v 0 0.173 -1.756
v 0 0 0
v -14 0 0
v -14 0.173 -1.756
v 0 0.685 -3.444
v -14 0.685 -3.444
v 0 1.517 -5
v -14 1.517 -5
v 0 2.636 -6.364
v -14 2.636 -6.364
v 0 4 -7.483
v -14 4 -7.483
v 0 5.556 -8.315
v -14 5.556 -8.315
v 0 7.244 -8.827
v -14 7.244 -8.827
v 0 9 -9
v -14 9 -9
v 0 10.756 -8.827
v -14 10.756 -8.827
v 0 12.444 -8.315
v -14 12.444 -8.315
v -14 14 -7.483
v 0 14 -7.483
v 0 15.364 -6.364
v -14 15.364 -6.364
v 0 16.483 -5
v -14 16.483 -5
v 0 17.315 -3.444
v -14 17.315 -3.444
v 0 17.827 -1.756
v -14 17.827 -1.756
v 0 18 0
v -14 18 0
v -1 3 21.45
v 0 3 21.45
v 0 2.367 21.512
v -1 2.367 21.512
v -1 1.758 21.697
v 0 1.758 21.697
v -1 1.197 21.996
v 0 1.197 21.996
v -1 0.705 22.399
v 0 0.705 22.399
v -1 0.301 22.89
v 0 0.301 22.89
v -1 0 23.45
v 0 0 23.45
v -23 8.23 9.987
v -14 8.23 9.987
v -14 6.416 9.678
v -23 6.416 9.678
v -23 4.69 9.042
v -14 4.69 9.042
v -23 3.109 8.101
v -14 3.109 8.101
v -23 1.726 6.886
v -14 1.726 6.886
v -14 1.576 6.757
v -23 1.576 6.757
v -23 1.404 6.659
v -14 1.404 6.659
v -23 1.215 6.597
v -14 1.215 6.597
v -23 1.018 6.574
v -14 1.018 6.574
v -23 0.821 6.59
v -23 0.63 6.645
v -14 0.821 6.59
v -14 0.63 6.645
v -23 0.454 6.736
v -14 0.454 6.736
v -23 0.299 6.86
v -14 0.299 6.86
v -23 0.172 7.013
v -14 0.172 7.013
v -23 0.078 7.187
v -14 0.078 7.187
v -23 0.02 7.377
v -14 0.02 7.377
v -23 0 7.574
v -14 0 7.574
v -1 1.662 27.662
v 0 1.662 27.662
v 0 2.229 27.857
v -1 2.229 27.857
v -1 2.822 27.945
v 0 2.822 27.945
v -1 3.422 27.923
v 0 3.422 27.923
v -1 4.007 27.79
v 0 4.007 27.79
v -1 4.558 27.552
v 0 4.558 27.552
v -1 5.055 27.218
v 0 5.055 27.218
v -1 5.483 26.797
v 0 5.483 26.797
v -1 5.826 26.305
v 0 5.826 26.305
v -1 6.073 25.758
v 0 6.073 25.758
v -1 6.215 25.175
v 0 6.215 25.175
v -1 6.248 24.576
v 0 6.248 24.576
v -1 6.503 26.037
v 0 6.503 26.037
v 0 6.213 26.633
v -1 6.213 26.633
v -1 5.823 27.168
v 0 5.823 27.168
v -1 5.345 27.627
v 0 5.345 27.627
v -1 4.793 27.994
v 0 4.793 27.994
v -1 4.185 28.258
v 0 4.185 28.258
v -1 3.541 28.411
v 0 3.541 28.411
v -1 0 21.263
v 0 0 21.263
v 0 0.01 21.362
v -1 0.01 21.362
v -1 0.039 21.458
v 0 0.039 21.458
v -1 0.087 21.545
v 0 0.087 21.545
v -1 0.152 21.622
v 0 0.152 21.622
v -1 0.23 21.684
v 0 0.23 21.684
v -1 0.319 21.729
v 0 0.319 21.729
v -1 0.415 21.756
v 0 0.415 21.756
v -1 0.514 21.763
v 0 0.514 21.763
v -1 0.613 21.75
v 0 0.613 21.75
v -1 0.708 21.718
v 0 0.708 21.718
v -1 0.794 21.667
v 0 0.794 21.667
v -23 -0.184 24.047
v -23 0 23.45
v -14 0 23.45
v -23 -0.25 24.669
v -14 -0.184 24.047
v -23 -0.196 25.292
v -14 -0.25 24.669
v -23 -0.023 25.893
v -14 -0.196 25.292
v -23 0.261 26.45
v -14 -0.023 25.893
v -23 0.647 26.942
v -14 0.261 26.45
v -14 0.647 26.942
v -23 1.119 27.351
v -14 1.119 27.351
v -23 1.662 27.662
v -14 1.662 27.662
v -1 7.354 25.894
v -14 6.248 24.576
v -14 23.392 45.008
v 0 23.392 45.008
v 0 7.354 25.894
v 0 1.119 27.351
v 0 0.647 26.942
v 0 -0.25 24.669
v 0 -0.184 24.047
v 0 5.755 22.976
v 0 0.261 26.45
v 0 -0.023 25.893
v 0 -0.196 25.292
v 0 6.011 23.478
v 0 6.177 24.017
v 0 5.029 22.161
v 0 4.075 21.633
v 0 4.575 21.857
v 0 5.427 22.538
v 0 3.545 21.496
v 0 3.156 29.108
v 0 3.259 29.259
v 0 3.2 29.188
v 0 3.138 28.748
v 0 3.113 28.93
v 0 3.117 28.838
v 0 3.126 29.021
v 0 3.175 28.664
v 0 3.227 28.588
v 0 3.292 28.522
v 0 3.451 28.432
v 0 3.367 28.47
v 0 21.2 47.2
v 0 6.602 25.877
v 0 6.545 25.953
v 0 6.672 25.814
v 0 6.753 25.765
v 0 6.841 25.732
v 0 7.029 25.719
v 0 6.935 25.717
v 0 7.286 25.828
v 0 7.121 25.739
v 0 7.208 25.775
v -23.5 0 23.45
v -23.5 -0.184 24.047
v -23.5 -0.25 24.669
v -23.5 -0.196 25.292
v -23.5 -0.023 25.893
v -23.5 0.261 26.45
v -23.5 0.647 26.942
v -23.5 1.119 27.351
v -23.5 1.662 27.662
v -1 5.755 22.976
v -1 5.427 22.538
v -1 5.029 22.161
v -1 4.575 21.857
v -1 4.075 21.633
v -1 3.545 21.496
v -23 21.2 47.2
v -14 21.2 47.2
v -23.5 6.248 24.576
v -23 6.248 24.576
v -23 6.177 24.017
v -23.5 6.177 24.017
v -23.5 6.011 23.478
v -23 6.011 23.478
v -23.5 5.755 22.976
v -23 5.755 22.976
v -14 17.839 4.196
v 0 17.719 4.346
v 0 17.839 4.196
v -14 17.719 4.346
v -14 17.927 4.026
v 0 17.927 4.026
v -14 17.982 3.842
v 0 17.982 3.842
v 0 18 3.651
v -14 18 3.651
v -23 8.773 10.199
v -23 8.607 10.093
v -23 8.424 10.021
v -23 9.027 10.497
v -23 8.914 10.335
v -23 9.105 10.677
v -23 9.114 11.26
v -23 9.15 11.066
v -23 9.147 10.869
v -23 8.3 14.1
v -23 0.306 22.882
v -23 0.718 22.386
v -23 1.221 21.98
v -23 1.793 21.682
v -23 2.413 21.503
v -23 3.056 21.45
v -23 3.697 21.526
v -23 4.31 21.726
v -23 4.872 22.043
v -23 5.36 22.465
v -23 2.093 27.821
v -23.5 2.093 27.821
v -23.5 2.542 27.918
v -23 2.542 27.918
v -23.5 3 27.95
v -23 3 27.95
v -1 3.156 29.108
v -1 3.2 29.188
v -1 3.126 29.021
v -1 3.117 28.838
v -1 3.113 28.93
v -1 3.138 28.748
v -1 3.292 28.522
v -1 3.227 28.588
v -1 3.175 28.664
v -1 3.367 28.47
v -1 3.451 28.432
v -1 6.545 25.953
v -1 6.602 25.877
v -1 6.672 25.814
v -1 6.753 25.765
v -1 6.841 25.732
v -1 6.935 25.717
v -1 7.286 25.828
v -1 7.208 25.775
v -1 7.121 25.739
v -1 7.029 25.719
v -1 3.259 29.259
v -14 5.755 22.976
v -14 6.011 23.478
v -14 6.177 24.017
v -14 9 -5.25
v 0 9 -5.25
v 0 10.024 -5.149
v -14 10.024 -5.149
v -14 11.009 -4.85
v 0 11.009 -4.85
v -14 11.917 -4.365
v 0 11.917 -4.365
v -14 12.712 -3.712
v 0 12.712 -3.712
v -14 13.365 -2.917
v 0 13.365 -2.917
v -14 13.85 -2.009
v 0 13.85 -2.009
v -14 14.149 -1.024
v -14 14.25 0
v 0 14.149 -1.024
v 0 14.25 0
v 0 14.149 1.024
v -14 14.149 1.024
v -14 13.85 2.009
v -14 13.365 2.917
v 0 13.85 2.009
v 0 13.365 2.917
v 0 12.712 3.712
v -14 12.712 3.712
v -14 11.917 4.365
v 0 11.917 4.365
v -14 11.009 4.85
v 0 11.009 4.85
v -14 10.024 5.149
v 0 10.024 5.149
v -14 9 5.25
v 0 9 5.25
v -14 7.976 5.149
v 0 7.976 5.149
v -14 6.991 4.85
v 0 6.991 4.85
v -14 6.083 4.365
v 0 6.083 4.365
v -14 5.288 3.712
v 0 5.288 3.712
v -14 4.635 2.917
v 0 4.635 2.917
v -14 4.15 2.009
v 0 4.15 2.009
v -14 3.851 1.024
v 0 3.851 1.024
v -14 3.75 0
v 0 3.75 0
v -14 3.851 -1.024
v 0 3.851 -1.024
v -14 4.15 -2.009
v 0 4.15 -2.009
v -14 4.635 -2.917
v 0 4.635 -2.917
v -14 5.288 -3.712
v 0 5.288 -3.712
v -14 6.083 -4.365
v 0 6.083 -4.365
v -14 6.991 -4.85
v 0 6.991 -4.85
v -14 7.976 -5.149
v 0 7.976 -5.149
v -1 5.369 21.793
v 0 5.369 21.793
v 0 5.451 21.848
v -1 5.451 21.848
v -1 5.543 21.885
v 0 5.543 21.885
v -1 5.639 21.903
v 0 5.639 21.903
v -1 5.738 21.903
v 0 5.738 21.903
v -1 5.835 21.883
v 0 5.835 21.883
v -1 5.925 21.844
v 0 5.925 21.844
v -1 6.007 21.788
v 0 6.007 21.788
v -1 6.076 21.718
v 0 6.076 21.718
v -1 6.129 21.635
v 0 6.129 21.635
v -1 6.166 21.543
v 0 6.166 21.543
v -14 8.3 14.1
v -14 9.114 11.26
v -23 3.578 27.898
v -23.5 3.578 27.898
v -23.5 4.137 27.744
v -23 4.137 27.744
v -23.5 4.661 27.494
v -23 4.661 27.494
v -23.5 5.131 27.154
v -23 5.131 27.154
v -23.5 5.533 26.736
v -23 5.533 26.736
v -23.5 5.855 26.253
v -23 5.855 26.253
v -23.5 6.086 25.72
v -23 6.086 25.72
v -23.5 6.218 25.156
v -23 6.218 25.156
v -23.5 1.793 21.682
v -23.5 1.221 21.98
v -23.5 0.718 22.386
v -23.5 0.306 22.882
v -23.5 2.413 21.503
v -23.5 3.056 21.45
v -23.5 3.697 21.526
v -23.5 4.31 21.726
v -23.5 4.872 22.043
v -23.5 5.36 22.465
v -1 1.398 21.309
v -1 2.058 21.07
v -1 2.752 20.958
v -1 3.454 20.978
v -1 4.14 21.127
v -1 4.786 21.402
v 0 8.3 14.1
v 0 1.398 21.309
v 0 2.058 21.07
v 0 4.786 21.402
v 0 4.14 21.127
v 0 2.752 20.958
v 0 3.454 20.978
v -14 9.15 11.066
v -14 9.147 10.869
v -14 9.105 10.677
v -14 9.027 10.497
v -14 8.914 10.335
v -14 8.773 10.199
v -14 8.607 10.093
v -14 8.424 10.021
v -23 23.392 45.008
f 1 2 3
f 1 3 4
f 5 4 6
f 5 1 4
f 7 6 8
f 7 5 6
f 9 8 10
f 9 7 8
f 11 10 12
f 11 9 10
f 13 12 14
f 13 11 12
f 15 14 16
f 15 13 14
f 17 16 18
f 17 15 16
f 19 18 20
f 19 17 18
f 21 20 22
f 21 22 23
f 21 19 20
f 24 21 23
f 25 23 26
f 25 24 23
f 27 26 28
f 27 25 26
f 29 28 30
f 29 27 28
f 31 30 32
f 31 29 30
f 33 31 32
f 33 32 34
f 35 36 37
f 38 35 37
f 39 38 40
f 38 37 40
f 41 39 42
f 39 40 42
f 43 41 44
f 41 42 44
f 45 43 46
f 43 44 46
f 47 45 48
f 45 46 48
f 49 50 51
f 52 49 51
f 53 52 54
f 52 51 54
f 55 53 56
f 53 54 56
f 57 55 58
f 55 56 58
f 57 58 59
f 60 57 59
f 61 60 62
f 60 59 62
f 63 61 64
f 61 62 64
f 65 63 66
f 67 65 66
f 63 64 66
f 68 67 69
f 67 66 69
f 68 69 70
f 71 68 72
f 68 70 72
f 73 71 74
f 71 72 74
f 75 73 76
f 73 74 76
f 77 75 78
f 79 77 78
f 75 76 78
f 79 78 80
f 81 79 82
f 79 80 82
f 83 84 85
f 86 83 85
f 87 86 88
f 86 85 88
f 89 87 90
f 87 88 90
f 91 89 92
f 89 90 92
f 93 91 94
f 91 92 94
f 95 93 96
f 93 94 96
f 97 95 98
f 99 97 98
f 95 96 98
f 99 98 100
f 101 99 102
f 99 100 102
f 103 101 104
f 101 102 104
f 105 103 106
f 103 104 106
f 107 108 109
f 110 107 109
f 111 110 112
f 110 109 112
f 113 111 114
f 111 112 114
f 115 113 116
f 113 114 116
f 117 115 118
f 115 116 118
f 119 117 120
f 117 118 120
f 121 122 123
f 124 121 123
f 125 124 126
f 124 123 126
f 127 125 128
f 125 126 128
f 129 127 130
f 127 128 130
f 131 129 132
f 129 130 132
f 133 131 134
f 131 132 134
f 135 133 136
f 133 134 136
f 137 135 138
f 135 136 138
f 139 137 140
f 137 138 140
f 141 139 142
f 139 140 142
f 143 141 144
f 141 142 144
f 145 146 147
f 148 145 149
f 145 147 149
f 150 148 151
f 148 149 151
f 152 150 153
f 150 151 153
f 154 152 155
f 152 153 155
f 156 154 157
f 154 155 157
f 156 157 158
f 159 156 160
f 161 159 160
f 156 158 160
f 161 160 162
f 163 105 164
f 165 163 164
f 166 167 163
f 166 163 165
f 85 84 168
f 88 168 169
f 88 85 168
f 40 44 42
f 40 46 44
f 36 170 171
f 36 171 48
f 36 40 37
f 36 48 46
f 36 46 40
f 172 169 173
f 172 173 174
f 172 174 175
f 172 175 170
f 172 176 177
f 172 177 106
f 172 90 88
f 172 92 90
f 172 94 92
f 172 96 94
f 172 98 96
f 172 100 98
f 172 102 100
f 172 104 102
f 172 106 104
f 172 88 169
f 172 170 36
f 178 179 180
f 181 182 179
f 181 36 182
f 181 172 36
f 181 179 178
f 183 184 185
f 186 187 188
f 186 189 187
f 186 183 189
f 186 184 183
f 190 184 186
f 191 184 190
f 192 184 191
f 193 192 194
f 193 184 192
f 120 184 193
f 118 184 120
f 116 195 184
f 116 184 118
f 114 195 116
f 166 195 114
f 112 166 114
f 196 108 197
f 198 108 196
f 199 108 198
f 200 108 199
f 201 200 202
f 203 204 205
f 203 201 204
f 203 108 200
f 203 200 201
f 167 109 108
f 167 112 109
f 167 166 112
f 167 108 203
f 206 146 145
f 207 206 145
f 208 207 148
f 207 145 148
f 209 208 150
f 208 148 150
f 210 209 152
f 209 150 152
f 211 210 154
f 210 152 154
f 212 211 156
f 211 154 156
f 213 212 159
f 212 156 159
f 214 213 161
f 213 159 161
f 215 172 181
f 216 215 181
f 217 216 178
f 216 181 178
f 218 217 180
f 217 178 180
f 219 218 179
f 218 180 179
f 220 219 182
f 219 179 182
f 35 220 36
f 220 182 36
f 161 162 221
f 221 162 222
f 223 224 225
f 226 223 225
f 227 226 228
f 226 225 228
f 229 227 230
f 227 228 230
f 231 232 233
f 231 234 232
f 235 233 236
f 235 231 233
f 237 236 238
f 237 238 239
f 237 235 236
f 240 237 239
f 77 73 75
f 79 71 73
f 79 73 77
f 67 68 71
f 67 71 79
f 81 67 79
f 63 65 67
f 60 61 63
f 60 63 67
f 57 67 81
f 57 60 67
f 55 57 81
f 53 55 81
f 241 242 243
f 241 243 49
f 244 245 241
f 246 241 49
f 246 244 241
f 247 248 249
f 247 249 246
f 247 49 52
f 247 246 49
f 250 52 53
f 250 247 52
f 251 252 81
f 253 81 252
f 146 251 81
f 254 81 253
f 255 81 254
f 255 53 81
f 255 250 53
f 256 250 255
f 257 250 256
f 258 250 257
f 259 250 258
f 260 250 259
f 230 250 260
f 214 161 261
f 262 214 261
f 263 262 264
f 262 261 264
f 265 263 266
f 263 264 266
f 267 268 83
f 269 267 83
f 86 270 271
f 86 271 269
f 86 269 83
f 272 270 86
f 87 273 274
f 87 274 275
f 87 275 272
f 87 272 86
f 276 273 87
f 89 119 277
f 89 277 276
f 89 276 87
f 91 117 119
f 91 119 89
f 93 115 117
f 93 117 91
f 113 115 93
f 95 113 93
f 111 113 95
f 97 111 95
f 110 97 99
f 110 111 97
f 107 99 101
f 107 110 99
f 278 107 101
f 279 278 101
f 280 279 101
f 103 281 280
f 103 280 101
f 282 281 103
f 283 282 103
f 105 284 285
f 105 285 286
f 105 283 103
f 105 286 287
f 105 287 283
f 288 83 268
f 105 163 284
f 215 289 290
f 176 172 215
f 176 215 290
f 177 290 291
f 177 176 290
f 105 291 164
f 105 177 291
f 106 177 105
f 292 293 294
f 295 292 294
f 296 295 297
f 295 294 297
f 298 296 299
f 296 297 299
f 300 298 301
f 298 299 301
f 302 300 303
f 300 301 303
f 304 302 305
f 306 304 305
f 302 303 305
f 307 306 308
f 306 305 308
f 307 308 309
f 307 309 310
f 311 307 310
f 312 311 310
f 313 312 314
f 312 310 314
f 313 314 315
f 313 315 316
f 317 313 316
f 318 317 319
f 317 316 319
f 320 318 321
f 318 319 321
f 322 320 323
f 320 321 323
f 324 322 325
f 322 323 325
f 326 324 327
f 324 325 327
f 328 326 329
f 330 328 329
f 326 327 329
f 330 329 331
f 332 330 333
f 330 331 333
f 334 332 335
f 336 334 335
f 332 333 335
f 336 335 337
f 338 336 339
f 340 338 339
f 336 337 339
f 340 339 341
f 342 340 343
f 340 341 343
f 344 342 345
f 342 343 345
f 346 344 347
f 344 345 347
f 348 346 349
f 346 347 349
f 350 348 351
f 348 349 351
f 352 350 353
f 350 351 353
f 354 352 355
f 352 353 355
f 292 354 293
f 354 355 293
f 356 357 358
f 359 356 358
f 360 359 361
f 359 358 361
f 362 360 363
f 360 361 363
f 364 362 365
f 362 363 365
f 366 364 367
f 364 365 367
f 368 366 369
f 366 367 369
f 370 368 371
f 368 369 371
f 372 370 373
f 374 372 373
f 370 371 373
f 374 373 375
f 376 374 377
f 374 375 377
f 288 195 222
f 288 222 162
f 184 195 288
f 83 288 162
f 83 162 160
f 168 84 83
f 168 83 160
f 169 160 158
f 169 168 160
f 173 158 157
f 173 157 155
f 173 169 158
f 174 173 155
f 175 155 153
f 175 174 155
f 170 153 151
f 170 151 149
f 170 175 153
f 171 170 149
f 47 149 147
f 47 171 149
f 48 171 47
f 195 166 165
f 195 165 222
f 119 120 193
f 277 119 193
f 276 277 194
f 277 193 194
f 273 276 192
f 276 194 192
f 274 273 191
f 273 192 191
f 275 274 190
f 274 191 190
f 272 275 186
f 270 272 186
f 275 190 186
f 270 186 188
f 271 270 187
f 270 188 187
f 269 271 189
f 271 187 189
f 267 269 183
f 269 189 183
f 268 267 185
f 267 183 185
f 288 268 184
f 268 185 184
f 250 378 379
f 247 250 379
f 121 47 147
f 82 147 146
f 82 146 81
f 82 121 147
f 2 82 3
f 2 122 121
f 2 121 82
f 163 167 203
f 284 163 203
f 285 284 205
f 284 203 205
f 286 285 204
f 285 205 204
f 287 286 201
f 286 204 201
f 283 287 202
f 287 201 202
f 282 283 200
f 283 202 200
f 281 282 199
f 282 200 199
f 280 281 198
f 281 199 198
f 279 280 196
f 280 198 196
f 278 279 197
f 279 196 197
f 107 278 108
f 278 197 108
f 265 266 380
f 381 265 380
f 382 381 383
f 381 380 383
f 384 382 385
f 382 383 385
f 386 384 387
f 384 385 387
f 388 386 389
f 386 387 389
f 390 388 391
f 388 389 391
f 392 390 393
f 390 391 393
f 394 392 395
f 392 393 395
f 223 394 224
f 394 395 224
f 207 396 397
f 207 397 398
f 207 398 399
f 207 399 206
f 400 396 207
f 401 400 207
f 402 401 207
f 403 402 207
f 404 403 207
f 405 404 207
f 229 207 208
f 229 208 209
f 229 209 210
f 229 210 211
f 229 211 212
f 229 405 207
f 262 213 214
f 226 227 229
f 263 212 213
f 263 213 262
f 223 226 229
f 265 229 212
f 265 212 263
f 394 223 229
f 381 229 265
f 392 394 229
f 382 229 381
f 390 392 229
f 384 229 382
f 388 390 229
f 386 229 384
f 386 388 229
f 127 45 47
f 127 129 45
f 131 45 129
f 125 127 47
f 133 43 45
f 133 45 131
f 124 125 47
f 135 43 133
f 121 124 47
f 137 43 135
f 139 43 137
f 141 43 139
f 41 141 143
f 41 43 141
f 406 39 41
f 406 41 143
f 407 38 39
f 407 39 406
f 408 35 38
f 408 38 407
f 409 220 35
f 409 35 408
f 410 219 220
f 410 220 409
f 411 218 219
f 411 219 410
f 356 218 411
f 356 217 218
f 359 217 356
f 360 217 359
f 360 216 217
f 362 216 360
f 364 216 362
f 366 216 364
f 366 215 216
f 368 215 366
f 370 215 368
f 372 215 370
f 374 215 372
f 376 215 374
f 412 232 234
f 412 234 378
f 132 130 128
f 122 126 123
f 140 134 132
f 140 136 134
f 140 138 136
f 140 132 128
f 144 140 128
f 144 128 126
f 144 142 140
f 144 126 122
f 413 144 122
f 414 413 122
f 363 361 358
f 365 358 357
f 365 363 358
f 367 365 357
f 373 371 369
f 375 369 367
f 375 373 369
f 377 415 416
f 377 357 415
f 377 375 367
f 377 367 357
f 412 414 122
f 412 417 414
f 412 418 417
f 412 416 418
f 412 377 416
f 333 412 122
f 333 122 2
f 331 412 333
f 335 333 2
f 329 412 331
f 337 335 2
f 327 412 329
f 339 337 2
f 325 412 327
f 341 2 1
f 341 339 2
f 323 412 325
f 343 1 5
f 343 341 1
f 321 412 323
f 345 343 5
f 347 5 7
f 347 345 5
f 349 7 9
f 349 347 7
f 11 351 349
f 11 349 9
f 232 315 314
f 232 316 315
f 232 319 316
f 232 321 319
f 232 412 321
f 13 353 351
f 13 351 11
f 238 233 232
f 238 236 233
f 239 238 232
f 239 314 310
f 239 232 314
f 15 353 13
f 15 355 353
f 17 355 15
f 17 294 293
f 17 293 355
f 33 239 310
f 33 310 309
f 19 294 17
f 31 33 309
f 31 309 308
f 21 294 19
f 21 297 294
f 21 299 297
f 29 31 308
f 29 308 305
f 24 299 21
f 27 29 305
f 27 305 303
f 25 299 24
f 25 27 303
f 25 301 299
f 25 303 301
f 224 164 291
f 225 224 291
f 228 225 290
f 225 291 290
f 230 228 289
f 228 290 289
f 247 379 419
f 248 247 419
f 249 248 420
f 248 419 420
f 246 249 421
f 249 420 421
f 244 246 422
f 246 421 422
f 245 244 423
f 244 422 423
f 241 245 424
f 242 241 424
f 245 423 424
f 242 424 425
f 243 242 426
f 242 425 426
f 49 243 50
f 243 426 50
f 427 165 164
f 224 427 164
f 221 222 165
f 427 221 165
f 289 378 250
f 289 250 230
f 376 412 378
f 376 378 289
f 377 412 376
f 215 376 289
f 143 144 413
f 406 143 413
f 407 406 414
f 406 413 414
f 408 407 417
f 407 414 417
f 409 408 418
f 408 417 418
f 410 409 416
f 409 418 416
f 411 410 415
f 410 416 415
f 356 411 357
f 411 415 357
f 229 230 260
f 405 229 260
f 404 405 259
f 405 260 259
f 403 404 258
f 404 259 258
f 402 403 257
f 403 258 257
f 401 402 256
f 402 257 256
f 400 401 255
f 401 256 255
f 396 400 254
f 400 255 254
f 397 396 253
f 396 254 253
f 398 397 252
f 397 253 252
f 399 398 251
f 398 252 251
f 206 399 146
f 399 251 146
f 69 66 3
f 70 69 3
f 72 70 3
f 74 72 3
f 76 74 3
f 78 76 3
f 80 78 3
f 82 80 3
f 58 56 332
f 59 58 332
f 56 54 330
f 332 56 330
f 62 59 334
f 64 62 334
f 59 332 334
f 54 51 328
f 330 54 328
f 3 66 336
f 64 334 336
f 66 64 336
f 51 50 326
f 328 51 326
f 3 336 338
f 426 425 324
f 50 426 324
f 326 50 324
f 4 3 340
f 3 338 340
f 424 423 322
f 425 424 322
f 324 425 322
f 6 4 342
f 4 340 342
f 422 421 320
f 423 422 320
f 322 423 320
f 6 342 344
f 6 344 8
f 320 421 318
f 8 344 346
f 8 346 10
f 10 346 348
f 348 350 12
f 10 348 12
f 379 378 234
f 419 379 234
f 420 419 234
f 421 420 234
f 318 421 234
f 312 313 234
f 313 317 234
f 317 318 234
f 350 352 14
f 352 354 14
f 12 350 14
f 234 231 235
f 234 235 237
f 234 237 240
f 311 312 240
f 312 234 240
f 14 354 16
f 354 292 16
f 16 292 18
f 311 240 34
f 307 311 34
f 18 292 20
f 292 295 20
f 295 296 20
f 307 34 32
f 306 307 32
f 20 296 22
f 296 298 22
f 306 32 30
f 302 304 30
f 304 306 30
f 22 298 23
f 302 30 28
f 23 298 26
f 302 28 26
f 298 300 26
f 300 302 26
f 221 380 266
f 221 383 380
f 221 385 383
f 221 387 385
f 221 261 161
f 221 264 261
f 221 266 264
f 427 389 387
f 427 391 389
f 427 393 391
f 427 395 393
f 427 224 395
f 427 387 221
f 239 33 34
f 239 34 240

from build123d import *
from build123d.topology import SkipClean

# Parameters (mm, degrees)
SKETCH2_R           = 5.25
BOSS_EXTRUDE1_DEPTH = 14
CUT_EXTRUDE1_DEPTH  = 1
CUT_EXTRUDE2_DEPTH  = 1
BOSS_EXTRUDE2_DEPTH = 9
BOSS_EXTRUDE3_DEPTH = 9.5
FILLET1_R           = 1


with BuildPart() as part:
    # Sketch2 → Boss-Extrude1 (new body)
    with BuildSketch(Plane(origin=(0, 0, 0), x_dir=(0, 0, -1), z_dir=(1, 0, 0))):
        with BuildLine():
            ThreePointArc((0, 0), (9, 9), (0, 18))
            Line((0, 18), (-4.055356, 18))
            Line((-4.055356, 18), (-14.1, 8.3))
            Line((-14.1, 8.3), (-22.975774, 5.754913))
            ThreePointArc((-22.975774, 5.754913), (-23.743648, 6.106105), (-24.576075, 6.247636))
            Line((-24.576075, 6.247636), (-45.007969, 23.392031))
            Line((-45.007969, 23.392031), (-47.2, 21.2))
            Line((-47.2, 21.2), (-27.661634, 1.661634))
            ThreePointArc((-27.661634, 1.661634), (-25.892761, -0.023214), (-23.45, 0))
            Line((-23.45, 0), (0, 0))
        make_face()
        with Locations((0, 9)):
            Circle(SKETCH2_R, mode=Mode.SUBTRACT)
    extrude(amount=-BOSS_EXTRUDE1_DEPTH)

    # Sketch2<5> → Cut-Extrude1 (cut)
    with BuildSketch(Plane(origin=(0, 0, 0), x_dir=(0, 0, -1), z_dir=(1, 0, 0))):
        with BuildLine():
            Line((-29.259155, 3.259155), (-27.661634, 1.661634))
            ThreePointArc((-27.661634, 1.661634), (-27.39648, 4.814248), (-24.576075, 6.247636))
            Line((-24.576075, 6.247636), (-25.894138, 7.353622))
            ThreePointArc((-25.894138, 7.353622), (-25.722467, 6.887608), (-26.037234, 6.503471))
            ThreePointArc((-26.037234, 6.503471), (-27.62666, 5.344603), (-28.410825, 3.540625))
            ThreePointArc((-28.410825, 3.540625), (-28.748146, 3.138148), (-29.259155, 3.259155))
        make_face()
    extrude(amount=-CUT_EXTRUDE1_DEPTH, mode=Mode.SUBTRACT)

    # Sketch2<6> → Cut-Extrude2 (cut)
    with SkipClean():  # the faces are left unmerged after this step: merging them gives an invalid solid
        with BuildSketch(Plane(origin=(0, 0, 0), x_dir=(0, 0, -1), z_dir=(1, 0, 0))):
            with BuildLine():
                Line((-23.45, 0), (-21.263068, 0))
                ThreePointArc((-21.263068, 0), (-21.708635, 0.273129), (-21.667413, 0.794118))
                ThreePointArc((-21.667413, 0.794118), (-20.951416, 3.103029), (-21.793156, 5.369126))
                ThreePointArc((-21.793156, 5.369126), (-21.882672, 5.834611), (-21.543396, 6.165641))
                Line((-21.543396, 6.165641), (-22.975774, 5.754913))
                ThreePointArc((-22.975774, 5.754913), (-21.856918, 4.574606), (-21.45, 3))
                ThreePointArc((-21.45, 3), (-21.995837, 1.197224), (-23.45, 0))
            make_face()
        extrude(amount=-CUT_EXTRUDE2_DEPTH, mode=Mode.SUBTRACT)

    # Sketch3 → Boss-Extrude2 (add)
    with SkipClean():  # the faces are left unmerged after this step: merging them gives an invalid solid
        with BuildSketch(Plane.ZY.offset(14)):
            with BuildLine():
                Line((47.2, 21.2), (45.007969, 23.392031))
                Line((45.007969, 23.392031), (24.576075, 6.247636))
                ThreePointArc((24.576075, 6.247636), (23.743648, 6.106105), (22.975774, 5.754913))
                Line((22.975774, 5.754913), (11.25959, 9.114474))
                ThreePointArc((11.25959, 9.114474), (10.413299, 8.974404), (9.986911, 8.230078))
                ThreePointArc((9.986911, 8.230078), (9.041707, 4.689697), (6.886416, 1.72618))
                ThreePointArc((6.886416, 1.72618), (6.644894, 0.629987), (7.57392, 0))
                Line((7.57392, 0), (23.45, 0))
                ThreePointArc((23.45, 0), (25.892761, -0.023214), (27.661634, 1.661634))
                Line((27.661634, 1.661634), (47.2, 21.2))
            make_face()
        extrude(amount=BOSS_EXTRUDE2_DEPTH)

    # Sketch3<3> → Boss-Extrude3 (add)
    with SkipClean():  # the faces are left unmerged after this step: merging them gives an invalid solid
        with BuildSketch(Plane.ZY.offset(14)):
            with BuildLine():
                ThreePointArc((27.95, 3), (26.953857, 5.341501), (24.576075, 6.247636))
                ThreePointArc((24.576075, 6.247636), (23.743648, 6.106105), (22.975774, 5.754913))
                ThreePointArc((22.975774, 5.754913), (21.460978, 2.733093), (23.45, 0))
                ThreePointArc((23.45, 0), (25.892761, -0.023214), (27.661634, 1.661634))
                ThreePointArc((27.661634, 1.661634), (27.877091, 2.31546), (27.95, 3))
            make_face()
        extrude(amount=BOSS_EXTRUDE3_DEPTH)

    # Fillet1
    fillet1_edges = [part.edges().sort_by_distance(p)[0] for p in [
        (-7, 18, 4.055356),
    ]]
    fillet(fillet1_edges, radius=FILLET1_R)


solid = part.part
